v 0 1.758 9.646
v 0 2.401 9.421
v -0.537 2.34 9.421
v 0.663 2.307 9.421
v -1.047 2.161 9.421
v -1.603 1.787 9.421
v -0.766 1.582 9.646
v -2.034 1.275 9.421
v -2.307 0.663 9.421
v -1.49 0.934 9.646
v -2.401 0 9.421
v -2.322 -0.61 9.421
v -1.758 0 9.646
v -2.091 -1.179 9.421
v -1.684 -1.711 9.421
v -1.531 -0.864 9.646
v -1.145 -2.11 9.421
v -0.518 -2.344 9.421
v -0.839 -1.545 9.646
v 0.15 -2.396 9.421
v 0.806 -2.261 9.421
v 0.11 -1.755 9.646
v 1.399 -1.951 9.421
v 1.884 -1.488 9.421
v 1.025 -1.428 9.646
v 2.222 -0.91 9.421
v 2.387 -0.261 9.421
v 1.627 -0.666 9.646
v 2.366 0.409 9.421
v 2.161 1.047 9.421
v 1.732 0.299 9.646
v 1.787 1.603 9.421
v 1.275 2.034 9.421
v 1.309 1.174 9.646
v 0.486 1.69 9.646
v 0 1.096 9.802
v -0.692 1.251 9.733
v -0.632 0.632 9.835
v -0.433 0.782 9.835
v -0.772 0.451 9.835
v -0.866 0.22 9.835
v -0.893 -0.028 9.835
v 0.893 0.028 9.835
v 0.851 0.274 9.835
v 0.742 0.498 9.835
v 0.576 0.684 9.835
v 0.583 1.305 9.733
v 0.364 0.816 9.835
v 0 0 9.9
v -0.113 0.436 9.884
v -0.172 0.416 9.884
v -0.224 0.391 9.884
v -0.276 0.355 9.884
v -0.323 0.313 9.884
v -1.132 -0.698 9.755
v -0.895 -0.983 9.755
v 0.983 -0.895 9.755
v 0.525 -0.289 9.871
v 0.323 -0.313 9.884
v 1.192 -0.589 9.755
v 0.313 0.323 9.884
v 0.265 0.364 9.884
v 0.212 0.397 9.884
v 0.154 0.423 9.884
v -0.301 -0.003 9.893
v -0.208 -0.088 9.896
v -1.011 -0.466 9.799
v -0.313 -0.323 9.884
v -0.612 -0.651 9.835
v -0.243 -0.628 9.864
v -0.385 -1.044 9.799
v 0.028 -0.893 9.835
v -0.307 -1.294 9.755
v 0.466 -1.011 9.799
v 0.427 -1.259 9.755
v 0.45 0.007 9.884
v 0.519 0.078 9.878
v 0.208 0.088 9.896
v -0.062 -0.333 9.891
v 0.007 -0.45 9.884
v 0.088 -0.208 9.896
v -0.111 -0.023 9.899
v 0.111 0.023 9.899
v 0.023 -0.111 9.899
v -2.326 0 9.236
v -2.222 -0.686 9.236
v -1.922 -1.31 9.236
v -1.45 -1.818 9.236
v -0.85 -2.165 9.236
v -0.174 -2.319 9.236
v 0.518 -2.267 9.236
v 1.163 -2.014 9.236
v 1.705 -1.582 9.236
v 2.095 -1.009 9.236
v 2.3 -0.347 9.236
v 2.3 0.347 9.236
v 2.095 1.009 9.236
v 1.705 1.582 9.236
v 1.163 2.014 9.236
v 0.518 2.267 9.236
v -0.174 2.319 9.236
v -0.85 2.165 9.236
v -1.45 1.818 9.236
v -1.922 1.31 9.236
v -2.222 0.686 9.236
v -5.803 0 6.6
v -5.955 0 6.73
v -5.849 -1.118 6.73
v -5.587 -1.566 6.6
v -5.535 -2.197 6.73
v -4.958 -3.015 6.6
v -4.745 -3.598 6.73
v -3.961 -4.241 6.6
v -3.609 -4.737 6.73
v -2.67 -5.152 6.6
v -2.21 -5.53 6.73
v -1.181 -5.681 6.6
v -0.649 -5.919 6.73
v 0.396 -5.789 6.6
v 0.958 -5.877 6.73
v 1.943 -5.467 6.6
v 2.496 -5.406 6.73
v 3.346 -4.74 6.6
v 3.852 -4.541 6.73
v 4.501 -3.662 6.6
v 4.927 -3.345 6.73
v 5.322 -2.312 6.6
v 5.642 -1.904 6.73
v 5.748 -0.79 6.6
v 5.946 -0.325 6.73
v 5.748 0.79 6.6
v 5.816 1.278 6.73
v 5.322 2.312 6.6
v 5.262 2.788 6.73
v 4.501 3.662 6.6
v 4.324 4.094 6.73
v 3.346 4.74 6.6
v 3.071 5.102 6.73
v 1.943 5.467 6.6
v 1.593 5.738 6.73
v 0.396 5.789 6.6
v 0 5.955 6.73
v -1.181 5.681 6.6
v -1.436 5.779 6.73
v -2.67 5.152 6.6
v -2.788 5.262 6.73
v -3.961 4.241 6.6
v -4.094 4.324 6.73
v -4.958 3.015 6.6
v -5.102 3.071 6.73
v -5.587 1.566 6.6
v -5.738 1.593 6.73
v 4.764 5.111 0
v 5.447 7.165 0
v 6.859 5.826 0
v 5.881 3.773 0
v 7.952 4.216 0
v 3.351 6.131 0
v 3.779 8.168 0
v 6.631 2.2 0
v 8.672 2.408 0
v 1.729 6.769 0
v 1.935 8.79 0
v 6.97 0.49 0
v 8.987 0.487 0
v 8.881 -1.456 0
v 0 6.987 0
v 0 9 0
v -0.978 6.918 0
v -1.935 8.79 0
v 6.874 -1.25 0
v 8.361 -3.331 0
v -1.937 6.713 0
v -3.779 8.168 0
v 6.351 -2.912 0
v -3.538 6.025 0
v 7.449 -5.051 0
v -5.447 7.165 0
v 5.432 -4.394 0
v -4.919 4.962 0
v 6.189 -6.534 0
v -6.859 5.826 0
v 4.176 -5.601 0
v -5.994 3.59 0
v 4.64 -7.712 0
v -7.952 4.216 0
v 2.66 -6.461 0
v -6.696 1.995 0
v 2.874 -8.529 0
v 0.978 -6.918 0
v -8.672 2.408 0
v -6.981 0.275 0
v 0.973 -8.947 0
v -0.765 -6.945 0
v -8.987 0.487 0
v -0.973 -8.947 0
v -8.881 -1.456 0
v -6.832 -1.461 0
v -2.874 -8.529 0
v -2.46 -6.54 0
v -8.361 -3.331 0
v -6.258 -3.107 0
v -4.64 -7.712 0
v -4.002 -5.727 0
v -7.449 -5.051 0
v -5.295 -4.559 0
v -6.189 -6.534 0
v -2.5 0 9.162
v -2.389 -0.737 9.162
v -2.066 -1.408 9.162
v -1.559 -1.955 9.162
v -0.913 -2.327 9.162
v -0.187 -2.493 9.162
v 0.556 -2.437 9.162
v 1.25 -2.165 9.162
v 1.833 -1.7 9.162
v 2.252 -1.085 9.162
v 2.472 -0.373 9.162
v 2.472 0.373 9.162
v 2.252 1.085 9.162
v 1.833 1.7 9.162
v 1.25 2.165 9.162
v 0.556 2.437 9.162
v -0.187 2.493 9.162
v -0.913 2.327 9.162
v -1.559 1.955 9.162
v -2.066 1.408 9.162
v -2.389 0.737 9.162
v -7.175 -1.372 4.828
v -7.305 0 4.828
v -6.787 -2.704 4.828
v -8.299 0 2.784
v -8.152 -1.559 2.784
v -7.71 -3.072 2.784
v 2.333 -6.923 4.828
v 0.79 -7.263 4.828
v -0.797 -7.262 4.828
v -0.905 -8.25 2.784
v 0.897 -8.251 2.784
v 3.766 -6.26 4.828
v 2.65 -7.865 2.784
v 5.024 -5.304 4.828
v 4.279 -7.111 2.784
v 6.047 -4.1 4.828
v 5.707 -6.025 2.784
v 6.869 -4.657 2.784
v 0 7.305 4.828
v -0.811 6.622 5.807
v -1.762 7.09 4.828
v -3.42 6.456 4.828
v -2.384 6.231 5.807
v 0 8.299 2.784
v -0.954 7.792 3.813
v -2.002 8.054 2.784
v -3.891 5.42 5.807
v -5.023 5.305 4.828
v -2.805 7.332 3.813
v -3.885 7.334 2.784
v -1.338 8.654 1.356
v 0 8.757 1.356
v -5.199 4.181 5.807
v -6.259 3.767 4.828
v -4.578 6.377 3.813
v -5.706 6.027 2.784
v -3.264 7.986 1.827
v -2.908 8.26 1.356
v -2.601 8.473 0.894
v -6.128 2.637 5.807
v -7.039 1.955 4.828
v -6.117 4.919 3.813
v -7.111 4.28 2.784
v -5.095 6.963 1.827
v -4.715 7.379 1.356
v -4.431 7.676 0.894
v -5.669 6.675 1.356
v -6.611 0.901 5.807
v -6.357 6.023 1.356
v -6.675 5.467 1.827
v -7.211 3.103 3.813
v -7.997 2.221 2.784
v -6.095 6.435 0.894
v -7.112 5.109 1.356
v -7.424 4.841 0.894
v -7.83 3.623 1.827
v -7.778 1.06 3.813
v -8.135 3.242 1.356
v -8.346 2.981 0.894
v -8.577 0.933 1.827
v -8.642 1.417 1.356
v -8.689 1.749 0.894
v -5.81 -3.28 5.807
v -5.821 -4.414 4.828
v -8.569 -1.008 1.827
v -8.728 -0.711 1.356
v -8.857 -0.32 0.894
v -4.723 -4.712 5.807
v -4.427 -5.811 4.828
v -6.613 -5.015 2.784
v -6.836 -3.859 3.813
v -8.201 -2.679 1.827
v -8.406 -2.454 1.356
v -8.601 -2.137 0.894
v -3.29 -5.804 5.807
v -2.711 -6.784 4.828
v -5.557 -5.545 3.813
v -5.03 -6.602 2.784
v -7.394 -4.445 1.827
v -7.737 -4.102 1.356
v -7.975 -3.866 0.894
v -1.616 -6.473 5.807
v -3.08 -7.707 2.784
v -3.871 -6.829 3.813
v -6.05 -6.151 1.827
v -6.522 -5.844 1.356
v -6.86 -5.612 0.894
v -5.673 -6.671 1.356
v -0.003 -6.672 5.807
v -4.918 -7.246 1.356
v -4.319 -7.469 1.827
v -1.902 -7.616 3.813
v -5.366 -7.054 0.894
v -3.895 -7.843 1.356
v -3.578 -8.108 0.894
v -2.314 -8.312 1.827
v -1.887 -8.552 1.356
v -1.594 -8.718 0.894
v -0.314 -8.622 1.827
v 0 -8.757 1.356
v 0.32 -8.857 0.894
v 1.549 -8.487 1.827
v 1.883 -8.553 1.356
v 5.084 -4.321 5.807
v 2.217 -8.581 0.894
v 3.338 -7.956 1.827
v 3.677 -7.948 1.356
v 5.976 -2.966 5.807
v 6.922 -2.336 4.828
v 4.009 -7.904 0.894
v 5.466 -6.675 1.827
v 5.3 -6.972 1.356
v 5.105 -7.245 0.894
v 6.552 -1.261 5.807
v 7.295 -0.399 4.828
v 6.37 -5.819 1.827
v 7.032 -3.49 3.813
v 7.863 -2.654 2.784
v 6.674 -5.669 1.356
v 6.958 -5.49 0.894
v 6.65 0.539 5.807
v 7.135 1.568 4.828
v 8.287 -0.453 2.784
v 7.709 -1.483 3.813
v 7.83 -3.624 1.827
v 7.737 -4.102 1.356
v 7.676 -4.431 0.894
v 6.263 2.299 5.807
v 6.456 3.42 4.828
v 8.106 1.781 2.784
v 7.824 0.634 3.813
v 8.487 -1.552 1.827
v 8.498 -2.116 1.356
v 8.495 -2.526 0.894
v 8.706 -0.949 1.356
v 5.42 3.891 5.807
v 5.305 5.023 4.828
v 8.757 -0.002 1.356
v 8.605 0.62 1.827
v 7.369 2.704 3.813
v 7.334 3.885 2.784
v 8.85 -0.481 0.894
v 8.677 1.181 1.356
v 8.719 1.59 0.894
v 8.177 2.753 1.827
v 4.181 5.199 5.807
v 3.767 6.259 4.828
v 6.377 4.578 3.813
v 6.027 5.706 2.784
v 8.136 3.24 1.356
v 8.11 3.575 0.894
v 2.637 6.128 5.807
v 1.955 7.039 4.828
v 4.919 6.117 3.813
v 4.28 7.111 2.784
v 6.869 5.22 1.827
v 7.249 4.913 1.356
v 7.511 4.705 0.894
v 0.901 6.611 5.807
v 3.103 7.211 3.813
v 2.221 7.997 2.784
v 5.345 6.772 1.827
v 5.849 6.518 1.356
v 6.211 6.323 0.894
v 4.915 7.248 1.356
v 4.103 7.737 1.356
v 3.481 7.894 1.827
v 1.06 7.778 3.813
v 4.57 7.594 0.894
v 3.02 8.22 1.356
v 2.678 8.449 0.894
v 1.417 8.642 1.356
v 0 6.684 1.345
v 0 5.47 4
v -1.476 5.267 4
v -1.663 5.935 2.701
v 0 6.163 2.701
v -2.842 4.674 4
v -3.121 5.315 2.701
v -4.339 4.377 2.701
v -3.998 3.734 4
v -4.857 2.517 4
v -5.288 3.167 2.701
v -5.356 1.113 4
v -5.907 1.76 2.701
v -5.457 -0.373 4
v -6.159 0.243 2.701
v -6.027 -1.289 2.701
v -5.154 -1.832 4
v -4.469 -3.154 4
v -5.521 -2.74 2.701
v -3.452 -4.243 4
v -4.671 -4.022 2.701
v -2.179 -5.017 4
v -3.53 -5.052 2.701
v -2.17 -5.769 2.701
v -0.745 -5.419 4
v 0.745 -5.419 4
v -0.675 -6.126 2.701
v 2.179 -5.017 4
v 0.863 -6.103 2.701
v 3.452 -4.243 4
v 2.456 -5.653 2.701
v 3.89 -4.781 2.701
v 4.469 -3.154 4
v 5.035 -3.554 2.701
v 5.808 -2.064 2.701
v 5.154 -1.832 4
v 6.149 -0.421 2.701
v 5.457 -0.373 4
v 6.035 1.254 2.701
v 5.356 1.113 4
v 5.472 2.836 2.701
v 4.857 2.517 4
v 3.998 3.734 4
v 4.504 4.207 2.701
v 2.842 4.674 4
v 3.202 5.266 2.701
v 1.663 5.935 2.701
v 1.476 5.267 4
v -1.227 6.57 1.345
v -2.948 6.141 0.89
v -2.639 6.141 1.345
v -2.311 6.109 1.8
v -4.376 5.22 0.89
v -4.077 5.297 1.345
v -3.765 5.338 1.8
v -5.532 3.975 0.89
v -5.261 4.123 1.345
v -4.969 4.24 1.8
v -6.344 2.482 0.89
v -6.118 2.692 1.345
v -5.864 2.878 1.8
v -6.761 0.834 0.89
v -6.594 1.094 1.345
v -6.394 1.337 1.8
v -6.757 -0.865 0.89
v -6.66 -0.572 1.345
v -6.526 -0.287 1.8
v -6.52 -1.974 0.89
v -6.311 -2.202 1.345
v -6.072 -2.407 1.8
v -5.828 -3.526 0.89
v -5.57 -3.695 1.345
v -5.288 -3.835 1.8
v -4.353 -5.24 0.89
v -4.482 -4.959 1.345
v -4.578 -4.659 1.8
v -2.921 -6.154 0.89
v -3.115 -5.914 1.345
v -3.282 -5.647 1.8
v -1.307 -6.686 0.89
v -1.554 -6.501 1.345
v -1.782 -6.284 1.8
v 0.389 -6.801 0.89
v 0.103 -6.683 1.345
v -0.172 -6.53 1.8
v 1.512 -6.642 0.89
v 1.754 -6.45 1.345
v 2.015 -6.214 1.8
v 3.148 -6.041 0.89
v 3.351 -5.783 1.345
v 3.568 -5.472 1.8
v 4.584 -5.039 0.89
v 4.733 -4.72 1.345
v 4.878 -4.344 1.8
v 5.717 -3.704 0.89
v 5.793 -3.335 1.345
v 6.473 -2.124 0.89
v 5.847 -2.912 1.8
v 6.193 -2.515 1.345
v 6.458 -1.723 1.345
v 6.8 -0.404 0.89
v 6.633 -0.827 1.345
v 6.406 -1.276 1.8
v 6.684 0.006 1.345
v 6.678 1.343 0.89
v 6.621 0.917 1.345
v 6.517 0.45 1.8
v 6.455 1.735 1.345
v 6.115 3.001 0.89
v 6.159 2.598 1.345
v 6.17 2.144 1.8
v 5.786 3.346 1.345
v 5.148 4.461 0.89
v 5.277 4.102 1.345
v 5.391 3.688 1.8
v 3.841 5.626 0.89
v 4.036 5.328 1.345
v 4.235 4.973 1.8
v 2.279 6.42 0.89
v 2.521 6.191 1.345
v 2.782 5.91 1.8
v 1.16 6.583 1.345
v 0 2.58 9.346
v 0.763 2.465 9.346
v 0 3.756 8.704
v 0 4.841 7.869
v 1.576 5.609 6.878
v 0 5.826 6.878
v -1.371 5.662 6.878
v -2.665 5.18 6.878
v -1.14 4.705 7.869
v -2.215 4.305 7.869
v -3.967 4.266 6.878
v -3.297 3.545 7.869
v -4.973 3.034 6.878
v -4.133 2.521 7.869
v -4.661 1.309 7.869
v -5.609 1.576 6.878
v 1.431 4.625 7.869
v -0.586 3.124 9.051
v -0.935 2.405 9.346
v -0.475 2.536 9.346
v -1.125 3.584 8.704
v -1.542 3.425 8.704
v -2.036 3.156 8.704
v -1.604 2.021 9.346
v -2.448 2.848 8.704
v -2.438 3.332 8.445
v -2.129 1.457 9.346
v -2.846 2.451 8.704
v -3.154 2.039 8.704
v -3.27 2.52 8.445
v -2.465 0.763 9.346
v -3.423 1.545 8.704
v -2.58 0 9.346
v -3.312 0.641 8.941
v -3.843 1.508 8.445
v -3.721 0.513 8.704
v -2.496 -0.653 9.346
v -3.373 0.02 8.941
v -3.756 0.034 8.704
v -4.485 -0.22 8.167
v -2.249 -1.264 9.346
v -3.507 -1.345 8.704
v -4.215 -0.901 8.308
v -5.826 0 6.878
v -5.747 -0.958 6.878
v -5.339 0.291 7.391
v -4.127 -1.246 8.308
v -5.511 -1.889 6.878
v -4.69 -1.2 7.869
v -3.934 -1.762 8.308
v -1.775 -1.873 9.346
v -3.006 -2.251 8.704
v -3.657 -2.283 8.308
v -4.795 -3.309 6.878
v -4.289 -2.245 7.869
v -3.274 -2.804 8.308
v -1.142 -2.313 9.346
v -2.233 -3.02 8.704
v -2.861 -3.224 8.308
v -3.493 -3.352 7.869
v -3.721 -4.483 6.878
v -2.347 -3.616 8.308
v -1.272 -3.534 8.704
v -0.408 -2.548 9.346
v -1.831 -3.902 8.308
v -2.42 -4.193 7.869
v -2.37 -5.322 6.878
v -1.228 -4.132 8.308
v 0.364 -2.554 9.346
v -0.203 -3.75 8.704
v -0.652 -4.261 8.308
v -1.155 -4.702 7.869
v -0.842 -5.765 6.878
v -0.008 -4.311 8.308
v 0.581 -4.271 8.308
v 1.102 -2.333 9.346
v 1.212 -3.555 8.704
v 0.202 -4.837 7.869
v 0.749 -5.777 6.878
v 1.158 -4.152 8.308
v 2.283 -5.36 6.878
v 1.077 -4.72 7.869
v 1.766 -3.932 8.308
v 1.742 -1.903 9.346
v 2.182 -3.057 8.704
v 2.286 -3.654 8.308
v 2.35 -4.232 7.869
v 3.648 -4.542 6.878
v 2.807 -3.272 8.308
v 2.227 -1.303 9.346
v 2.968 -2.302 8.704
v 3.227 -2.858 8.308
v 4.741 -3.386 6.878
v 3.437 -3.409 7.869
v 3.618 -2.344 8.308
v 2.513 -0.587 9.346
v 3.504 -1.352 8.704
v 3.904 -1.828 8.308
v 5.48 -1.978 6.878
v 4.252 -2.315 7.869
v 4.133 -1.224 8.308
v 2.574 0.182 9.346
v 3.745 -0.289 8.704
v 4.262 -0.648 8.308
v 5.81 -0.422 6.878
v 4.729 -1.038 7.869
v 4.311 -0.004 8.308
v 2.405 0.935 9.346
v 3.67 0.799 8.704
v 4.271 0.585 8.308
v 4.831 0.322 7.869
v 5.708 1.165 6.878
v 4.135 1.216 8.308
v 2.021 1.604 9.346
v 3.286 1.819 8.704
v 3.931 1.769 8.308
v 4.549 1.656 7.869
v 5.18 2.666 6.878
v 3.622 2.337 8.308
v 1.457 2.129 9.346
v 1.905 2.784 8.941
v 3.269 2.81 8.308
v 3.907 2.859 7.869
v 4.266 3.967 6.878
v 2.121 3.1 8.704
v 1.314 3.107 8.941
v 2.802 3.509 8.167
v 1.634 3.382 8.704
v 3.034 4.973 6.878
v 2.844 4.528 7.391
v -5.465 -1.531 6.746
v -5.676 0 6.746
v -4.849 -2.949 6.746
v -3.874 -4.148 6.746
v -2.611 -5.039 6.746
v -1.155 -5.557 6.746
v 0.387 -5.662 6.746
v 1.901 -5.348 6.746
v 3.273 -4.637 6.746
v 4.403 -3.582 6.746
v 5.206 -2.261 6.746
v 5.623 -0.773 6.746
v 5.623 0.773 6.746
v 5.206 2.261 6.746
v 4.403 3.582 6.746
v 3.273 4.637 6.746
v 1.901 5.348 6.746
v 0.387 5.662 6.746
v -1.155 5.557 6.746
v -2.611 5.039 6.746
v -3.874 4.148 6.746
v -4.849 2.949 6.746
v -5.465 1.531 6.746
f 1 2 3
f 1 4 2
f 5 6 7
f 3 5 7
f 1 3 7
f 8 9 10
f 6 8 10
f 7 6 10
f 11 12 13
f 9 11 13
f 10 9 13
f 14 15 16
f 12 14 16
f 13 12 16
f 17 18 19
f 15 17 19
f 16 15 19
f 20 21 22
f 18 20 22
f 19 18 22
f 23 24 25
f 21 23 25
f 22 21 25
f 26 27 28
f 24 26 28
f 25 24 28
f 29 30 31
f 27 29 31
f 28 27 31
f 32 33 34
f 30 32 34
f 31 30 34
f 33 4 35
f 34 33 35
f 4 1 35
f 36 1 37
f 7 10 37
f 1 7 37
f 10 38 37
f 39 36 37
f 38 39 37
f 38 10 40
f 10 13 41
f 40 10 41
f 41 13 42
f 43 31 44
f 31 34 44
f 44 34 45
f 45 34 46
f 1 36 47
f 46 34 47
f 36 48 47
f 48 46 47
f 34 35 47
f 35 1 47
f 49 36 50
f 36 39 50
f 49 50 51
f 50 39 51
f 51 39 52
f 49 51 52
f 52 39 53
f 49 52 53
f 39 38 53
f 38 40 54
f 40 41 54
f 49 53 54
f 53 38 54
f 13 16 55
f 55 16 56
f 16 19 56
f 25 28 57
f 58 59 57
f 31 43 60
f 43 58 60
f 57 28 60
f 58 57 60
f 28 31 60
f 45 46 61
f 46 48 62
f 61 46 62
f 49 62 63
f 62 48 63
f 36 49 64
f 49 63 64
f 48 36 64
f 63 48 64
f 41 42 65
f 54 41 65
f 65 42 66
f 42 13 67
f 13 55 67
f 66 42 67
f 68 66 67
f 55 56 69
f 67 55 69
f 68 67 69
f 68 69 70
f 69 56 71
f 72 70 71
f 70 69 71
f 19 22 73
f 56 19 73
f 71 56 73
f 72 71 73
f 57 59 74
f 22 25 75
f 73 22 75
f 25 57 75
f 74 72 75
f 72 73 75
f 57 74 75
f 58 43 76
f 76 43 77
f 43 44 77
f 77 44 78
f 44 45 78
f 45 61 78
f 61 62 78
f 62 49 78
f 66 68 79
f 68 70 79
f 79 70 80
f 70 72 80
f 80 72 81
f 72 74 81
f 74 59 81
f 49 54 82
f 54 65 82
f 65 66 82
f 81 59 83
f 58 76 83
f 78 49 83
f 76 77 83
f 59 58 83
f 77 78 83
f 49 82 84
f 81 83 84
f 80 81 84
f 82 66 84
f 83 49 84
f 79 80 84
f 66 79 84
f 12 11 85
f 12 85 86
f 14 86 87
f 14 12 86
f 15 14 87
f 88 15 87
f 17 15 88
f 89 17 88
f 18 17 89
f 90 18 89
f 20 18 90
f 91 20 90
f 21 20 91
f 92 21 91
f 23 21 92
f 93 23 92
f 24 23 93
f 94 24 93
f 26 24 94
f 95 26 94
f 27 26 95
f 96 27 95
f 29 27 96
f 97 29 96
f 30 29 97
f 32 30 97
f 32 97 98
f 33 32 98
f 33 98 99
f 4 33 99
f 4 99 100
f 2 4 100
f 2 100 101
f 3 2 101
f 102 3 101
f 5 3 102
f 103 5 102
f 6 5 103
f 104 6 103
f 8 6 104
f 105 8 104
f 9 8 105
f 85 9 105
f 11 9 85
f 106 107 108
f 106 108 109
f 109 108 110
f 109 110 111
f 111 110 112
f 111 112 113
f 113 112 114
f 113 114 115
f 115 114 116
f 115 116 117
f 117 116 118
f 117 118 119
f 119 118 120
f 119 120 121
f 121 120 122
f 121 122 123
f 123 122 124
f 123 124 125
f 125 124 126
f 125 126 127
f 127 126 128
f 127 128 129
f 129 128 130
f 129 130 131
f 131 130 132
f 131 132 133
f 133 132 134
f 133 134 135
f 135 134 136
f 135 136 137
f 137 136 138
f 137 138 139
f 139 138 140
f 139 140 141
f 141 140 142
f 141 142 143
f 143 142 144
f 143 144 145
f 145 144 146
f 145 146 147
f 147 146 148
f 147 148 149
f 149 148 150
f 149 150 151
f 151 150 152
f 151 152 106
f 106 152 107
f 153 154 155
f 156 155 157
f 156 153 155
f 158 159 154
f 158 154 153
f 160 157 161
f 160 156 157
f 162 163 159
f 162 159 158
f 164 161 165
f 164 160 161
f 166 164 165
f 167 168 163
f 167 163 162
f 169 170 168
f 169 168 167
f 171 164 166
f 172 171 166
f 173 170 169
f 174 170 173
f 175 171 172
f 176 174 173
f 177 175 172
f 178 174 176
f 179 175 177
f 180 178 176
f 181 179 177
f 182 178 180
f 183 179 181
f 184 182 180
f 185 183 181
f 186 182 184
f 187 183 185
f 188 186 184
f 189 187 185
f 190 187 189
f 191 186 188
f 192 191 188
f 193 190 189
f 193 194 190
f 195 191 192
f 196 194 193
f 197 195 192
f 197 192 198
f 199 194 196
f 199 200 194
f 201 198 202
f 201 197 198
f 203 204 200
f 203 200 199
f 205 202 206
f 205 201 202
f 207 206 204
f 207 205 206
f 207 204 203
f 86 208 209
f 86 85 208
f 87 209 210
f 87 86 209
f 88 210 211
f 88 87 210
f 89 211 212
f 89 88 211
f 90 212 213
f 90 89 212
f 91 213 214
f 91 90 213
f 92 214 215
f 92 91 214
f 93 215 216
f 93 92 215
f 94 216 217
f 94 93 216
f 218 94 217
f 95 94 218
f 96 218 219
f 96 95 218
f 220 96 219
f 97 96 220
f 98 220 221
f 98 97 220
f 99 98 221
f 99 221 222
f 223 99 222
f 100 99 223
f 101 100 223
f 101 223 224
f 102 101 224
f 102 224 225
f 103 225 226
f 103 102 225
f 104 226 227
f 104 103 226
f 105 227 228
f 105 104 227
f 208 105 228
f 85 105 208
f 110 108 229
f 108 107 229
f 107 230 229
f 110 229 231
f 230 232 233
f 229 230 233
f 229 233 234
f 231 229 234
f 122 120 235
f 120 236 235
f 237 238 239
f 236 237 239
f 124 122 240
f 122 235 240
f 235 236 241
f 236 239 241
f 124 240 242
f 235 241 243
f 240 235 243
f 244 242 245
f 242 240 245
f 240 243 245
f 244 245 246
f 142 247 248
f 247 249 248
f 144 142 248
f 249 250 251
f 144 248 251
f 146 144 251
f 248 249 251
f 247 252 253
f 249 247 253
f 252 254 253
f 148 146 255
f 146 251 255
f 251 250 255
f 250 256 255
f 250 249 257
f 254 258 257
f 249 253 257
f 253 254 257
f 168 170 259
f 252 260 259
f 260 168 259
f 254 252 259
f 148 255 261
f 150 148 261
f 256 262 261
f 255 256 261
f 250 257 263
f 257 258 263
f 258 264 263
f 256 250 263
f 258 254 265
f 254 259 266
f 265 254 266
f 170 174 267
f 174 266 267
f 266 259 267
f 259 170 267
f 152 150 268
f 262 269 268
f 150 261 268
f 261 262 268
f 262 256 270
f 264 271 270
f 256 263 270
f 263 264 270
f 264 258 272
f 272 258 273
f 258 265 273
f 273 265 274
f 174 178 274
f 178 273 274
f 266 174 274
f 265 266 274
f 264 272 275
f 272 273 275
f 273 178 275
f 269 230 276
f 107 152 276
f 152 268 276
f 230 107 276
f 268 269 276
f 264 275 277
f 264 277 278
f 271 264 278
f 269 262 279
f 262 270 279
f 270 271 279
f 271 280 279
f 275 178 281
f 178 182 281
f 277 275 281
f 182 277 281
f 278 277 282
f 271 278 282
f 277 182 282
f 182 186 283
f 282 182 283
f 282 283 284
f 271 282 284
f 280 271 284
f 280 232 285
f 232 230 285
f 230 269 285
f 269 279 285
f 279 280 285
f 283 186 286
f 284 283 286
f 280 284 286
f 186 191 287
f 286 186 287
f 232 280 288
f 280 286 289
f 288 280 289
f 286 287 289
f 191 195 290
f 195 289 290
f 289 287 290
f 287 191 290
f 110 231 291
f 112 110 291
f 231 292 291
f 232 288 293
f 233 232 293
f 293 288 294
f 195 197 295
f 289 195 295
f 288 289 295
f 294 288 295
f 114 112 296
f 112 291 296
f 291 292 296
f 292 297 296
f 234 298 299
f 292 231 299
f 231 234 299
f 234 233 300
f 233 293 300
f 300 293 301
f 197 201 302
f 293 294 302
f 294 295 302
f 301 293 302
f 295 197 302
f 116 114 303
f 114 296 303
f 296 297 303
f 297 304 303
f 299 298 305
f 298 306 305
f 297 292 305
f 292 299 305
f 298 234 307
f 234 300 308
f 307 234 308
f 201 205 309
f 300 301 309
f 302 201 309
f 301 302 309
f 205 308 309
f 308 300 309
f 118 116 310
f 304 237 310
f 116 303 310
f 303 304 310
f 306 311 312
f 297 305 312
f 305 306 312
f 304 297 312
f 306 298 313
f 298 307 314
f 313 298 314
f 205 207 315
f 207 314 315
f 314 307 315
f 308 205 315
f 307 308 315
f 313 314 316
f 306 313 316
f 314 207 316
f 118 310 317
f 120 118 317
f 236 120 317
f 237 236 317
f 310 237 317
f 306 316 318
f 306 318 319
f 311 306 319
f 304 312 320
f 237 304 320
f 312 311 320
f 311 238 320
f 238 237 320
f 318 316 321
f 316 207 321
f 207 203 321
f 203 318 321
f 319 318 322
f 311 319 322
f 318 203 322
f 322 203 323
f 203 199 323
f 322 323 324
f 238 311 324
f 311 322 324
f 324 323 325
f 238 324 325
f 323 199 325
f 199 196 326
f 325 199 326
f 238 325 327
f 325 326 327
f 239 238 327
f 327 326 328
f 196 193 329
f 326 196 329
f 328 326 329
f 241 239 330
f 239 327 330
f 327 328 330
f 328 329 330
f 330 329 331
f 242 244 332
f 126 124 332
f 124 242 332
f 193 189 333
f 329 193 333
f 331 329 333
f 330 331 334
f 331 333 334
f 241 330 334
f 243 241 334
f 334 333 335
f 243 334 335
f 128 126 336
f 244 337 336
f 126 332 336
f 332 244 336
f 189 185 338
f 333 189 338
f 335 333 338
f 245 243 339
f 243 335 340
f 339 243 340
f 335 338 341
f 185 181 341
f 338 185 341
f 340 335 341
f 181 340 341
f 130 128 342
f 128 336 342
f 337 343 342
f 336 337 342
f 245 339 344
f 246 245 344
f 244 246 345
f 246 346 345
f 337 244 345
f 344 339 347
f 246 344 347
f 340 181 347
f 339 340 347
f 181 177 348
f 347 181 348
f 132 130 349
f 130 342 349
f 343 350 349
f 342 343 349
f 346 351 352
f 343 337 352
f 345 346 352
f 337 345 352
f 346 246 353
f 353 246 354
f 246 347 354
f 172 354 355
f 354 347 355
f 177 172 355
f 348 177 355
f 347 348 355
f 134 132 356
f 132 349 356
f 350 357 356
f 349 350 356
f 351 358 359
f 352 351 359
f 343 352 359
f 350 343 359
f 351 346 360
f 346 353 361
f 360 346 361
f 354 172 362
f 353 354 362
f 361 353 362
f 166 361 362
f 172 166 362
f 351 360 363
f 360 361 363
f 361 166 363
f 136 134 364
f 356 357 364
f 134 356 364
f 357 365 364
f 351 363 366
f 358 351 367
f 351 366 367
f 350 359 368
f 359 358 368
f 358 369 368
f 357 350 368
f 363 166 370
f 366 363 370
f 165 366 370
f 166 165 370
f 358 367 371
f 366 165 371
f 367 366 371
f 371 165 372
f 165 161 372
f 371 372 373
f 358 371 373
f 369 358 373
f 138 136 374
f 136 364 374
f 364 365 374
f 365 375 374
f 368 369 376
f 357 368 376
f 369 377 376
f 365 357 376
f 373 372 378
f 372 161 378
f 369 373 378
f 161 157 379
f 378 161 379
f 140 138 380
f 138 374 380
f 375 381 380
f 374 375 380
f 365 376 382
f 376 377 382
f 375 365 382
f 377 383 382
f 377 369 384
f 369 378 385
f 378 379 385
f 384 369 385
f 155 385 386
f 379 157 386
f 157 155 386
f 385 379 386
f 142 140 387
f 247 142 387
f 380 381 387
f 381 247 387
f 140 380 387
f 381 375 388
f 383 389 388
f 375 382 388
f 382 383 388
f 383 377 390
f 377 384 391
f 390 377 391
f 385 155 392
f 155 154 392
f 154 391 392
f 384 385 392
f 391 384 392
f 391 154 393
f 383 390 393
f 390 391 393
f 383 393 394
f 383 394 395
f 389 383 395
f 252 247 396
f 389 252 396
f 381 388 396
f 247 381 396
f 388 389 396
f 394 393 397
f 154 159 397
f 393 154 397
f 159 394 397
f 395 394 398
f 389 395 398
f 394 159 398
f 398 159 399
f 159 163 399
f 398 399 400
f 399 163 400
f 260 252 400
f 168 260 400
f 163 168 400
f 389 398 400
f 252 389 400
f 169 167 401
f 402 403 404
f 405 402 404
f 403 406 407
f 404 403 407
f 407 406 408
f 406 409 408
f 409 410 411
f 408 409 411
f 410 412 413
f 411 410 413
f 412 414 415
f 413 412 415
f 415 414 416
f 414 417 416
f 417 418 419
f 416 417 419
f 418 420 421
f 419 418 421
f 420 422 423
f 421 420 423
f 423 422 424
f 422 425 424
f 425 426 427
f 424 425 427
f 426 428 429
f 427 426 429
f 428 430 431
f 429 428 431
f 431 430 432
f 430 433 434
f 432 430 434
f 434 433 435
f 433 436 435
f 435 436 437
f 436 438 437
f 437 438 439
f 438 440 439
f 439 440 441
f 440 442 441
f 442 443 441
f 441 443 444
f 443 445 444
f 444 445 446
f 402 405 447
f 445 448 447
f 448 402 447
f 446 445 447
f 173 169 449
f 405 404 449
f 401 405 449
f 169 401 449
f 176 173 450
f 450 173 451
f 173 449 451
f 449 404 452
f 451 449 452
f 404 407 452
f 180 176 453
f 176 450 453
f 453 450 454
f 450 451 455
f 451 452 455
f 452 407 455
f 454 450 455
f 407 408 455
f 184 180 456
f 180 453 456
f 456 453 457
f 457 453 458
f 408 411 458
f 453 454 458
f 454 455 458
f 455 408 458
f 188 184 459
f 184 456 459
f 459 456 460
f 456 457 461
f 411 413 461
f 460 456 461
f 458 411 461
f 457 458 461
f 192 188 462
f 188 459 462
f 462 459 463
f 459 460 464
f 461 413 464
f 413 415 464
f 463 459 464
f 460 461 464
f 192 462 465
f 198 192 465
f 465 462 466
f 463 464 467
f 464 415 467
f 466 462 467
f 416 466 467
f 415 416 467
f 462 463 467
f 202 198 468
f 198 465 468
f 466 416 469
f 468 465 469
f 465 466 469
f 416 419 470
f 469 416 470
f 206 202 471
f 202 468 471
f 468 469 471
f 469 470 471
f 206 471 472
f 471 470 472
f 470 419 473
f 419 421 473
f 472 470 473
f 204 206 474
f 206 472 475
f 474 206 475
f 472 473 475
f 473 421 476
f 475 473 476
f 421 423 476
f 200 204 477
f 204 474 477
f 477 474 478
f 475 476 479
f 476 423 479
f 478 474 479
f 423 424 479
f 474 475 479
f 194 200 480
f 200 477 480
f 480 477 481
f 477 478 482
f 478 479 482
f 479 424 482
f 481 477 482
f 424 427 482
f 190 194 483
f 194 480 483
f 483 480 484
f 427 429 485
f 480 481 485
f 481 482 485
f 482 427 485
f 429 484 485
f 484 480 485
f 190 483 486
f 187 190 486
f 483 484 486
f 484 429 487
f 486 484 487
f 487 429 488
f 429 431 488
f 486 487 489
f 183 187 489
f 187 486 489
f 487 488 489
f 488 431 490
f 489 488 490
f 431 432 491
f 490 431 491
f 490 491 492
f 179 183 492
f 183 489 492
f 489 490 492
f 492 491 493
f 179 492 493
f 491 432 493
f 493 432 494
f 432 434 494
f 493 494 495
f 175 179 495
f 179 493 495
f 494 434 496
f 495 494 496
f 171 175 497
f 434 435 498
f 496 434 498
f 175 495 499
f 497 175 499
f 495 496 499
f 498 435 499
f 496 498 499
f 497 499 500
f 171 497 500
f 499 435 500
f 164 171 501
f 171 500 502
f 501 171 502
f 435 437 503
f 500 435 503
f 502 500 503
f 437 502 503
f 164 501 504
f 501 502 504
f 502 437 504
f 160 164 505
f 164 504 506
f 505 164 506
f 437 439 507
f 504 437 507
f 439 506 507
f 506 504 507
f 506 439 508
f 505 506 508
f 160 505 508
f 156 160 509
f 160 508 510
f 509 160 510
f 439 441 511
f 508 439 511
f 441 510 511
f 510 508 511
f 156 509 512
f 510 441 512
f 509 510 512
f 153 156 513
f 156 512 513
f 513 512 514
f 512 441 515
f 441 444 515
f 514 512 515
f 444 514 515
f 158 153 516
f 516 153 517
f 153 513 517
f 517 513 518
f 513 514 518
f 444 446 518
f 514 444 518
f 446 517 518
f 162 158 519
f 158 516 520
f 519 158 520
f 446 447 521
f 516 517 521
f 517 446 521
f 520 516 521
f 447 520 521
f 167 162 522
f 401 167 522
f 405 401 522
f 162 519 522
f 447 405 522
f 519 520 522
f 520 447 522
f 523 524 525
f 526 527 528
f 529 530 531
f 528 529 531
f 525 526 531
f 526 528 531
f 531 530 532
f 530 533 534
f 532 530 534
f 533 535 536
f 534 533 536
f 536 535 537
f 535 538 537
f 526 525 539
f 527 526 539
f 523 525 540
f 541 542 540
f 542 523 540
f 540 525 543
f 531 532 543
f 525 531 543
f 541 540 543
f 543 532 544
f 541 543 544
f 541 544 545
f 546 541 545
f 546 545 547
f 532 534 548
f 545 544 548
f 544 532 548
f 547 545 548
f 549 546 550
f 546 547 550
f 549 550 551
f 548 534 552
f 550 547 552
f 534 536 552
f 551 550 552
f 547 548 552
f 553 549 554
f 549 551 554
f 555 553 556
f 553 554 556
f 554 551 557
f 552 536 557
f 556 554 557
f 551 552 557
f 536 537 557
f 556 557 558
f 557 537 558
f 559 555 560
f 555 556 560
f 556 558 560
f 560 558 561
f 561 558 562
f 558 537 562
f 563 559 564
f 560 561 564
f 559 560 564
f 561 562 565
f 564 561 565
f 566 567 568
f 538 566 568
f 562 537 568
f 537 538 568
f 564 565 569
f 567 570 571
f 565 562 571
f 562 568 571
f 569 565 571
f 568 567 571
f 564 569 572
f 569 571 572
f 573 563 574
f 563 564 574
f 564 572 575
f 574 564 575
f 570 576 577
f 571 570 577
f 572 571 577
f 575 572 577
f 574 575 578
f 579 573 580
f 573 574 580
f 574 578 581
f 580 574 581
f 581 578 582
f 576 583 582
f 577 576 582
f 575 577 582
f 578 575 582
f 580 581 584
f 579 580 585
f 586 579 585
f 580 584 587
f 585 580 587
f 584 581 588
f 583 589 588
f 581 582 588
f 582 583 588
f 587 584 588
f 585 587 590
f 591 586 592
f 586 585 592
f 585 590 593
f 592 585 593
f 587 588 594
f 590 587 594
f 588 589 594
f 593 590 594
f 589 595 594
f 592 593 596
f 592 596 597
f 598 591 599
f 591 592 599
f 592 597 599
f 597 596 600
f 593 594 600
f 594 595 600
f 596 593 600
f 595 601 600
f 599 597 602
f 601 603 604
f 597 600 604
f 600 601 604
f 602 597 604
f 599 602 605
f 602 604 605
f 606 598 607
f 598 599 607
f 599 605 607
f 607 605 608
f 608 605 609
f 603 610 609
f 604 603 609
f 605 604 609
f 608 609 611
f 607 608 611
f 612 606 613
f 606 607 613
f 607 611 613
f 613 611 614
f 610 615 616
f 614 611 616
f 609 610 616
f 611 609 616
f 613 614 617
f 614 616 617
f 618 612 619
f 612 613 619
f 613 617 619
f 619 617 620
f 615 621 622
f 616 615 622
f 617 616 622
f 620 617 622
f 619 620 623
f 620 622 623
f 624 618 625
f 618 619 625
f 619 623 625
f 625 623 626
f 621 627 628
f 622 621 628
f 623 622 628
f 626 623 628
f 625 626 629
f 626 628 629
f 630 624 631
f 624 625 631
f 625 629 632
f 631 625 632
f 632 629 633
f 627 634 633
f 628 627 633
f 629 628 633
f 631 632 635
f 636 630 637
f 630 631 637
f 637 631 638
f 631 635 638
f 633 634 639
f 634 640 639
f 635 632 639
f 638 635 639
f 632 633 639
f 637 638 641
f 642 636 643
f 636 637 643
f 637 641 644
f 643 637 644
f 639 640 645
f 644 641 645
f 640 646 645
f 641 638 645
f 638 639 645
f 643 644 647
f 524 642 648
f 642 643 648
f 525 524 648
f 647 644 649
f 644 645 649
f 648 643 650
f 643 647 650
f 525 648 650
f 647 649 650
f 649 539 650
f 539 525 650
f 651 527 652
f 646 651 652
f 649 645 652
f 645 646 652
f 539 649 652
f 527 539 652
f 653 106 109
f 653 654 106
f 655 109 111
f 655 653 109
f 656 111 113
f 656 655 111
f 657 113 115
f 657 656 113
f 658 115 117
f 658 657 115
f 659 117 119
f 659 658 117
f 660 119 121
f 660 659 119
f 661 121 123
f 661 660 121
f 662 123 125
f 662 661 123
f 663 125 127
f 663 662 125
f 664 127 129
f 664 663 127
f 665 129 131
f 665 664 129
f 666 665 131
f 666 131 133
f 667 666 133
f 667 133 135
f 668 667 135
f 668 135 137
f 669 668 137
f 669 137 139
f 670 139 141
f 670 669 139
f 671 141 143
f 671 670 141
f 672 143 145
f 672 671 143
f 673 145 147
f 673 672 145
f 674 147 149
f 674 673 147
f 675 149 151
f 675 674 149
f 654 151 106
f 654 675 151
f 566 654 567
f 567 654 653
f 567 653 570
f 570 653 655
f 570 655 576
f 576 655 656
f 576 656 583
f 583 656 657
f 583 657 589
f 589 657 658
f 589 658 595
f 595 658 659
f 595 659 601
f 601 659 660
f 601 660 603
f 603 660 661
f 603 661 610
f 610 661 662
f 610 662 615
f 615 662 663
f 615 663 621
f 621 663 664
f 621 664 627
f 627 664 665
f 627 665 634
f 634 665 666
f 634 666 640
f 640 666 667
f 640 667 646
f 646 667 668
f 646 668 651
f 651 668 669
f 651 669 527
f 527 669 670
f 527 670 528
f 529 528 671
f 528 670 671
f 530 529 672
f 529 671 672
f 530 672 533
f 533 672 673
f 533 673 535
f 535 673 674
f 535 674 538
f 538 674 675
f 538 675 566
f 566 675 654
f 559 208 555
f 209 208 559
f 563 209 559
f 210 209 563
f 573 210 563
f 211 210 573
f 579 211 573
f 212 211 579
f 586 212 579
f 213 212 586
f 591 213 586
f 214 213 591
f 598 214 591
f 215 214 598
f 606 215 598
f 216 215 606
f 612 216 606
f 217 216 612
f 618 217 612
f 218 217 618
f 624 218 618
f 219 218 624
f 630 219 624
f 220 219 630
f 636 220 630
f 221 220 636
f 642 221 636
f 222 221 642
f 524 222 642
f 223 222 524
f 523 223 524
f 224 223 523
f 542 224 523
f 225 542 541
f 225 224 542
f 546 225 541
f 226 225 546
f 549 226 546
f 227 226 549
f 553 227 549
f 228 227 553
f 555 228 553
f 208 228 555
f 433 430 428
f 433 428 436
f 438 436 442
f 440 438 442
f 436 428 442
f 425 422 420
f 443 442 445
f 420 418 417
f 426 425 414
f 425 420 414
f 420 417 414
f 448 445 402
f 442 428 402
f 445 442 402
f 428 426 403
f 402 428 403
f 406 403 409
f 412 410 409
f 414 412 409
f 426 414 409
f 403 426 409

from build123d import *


with BuildPart() as part:
    # Esboço1 → Revolução1 (revolve)
    with BuildSketch(Plane(origin=(0, 0, 0), x_dir=(0, 0, -1), z_dir=(1, 0, 0))):
        with BuildLine():
            Line((-9.9, 0), (0, 0))
            Line((0, 0), (0, 9))
            add(Edge.make_bspline(
                [(-9.9, 0), (-9.909983233, 4.865844561), (-4.030430742, 8.598672438), (0, 9)],
                knots=[0, 0, 0, 0, 1, 1, 1, 1], degree=3))
        make_face()
    revolve(axis=Axis((0, 0, -0.495249581), (0, 0, 1)))

    # Esboço2 → Corte-Revolução1 (revolve, cut)
    with BuildSketch(Plane(origin=(0, 0, 0), x_dir=(0, 0, -1), z_dir=(1, 0, 0))):
        with BuildLine():
            Line((-4, 5.469953061), (-4, 0))
            Line((-4, 0), (1, 0))
            Line((1, 0), (1, 7.09390119))
            add(Edge.make_bspline(
                [(1, 7.09390119), (0.241512964, 7.01284271), (0.209991891, 7.011809212), (0.086311605, 6.997699099), (0.057571185, 6.994232877), (-0.027522658, 6.983363535), (-0.084931827, 6.975254523), (-0.257903575, 6.948559915), (-0.374697634, 6.927544949), (-0.727785948, 6.85558027), (-0.966699441, 6.795740091), (-1.684998489, 6.585696706), (-2.16561255, 6.405303013), (-3.103396143, 5.982045517), (-3.561210819, 5.739533633), (-4, 5.469953061)],
                knots=[-0.018640512, -0.018640512, -0.018640512, -0.018640512, 0.0078125, 0.0078125, 0.015625, 0.015625, 0.03125, 0.03125, 0.0625, 0.0625, 0.125, 0.125, 0.25, 0.25, 0.374605818, 0.374605818, 0.374605818, 0.374605818], degree=3))
        make_face()
    revolve(axis=Axis((0, 0, -0.495249581), (0, 0, 1)), mode=Mode.SUBTRACT)

    # Esboço4 → Corte-Revolução2 (revolve, cut)
    with BuildSketch(Plane(origin=(0, 0, 0), x_dir=(0, 0, -1), z_dir=(1, 0, 0))):
        with BuildLine():
            Line((-7.010691462, 5.975922882), (-6.746324533, 5.675729353))
            add(Edge.make_bspline(
                [(-6.6, 5.802525488), (-6.64911679, 5.760642692), (-6.697896572, 5.718377678), (-6.746324533, 5.675729353)],
                knots=[0.518643322, 0.518643322, 0.518643322, 0.518643322, 0.532269657, 0.532269657, 0.532269657, 0.532269657], degree=3))
            Line((-6.6, 5.802525488), (-6.859541532, 6.106895011))
            add(Edge.make_bspline(
                [(-6.859541532, 6.106895011), (-6.910263, 6.063645619), (-6.960651247, 6.019989162), (-7.010691462, 5.975922882)],
                knots=[0.518640951, 0.518640951, 0.518640951, 0.518640951, 0.532267119, 0.532267119, 0.532267119, 0.532267119], degree=3))
        make_face()
    revolve(axis=Axis((0, 0, -0.495249581), (0, 0, 1)), mode=Mode.SUBTRACT)

    # Esboço5 → Corte-Revolução3 (revolve, cut)
    with BuildSketch(Plane(origin=(0, 0, 0), x_dir=(0, 0, -1), z_dir=(1, 0, 0))):
        with BuildLine():
            Line((-9.528707684, 2.660294167), (-9.162349853, 2.5))
            add(Edge.make_bspline(
                [(-9.162349853, 2.5), (-9.187658731, 2.44215569), (-9.212156272, 2.384053697), (-9.235824688, 2.325698344)],
                knots=[0.601133562, 0.601133562, 0.601133562, 0.601133562, 0.63051293, 0.63051293, 0.63051293, 0.63051293], degree=3))
            Line((-9.235824688, 2.325698344), (-9.606351735, 2.475980843))
            add(Edge.make_bspline(
                [(-9.528707684, 2.660294167), (-9.555435364, 2.599167889), (-9.581323805, 2.537727857), (-9.606351735, 2.475980843)],
                knots=[0.601091643, 0.601091643, 0.601091643, 0.601091643, 0.630455711, 0.630455711, 0.630455711, 0.630455711], degree=3))
        make_face()
    revolve(axis=Axis((0, 0, -0.495249581), (0, 0, 1)), mode=Mode.SUBTRACT)


solid = part.part
